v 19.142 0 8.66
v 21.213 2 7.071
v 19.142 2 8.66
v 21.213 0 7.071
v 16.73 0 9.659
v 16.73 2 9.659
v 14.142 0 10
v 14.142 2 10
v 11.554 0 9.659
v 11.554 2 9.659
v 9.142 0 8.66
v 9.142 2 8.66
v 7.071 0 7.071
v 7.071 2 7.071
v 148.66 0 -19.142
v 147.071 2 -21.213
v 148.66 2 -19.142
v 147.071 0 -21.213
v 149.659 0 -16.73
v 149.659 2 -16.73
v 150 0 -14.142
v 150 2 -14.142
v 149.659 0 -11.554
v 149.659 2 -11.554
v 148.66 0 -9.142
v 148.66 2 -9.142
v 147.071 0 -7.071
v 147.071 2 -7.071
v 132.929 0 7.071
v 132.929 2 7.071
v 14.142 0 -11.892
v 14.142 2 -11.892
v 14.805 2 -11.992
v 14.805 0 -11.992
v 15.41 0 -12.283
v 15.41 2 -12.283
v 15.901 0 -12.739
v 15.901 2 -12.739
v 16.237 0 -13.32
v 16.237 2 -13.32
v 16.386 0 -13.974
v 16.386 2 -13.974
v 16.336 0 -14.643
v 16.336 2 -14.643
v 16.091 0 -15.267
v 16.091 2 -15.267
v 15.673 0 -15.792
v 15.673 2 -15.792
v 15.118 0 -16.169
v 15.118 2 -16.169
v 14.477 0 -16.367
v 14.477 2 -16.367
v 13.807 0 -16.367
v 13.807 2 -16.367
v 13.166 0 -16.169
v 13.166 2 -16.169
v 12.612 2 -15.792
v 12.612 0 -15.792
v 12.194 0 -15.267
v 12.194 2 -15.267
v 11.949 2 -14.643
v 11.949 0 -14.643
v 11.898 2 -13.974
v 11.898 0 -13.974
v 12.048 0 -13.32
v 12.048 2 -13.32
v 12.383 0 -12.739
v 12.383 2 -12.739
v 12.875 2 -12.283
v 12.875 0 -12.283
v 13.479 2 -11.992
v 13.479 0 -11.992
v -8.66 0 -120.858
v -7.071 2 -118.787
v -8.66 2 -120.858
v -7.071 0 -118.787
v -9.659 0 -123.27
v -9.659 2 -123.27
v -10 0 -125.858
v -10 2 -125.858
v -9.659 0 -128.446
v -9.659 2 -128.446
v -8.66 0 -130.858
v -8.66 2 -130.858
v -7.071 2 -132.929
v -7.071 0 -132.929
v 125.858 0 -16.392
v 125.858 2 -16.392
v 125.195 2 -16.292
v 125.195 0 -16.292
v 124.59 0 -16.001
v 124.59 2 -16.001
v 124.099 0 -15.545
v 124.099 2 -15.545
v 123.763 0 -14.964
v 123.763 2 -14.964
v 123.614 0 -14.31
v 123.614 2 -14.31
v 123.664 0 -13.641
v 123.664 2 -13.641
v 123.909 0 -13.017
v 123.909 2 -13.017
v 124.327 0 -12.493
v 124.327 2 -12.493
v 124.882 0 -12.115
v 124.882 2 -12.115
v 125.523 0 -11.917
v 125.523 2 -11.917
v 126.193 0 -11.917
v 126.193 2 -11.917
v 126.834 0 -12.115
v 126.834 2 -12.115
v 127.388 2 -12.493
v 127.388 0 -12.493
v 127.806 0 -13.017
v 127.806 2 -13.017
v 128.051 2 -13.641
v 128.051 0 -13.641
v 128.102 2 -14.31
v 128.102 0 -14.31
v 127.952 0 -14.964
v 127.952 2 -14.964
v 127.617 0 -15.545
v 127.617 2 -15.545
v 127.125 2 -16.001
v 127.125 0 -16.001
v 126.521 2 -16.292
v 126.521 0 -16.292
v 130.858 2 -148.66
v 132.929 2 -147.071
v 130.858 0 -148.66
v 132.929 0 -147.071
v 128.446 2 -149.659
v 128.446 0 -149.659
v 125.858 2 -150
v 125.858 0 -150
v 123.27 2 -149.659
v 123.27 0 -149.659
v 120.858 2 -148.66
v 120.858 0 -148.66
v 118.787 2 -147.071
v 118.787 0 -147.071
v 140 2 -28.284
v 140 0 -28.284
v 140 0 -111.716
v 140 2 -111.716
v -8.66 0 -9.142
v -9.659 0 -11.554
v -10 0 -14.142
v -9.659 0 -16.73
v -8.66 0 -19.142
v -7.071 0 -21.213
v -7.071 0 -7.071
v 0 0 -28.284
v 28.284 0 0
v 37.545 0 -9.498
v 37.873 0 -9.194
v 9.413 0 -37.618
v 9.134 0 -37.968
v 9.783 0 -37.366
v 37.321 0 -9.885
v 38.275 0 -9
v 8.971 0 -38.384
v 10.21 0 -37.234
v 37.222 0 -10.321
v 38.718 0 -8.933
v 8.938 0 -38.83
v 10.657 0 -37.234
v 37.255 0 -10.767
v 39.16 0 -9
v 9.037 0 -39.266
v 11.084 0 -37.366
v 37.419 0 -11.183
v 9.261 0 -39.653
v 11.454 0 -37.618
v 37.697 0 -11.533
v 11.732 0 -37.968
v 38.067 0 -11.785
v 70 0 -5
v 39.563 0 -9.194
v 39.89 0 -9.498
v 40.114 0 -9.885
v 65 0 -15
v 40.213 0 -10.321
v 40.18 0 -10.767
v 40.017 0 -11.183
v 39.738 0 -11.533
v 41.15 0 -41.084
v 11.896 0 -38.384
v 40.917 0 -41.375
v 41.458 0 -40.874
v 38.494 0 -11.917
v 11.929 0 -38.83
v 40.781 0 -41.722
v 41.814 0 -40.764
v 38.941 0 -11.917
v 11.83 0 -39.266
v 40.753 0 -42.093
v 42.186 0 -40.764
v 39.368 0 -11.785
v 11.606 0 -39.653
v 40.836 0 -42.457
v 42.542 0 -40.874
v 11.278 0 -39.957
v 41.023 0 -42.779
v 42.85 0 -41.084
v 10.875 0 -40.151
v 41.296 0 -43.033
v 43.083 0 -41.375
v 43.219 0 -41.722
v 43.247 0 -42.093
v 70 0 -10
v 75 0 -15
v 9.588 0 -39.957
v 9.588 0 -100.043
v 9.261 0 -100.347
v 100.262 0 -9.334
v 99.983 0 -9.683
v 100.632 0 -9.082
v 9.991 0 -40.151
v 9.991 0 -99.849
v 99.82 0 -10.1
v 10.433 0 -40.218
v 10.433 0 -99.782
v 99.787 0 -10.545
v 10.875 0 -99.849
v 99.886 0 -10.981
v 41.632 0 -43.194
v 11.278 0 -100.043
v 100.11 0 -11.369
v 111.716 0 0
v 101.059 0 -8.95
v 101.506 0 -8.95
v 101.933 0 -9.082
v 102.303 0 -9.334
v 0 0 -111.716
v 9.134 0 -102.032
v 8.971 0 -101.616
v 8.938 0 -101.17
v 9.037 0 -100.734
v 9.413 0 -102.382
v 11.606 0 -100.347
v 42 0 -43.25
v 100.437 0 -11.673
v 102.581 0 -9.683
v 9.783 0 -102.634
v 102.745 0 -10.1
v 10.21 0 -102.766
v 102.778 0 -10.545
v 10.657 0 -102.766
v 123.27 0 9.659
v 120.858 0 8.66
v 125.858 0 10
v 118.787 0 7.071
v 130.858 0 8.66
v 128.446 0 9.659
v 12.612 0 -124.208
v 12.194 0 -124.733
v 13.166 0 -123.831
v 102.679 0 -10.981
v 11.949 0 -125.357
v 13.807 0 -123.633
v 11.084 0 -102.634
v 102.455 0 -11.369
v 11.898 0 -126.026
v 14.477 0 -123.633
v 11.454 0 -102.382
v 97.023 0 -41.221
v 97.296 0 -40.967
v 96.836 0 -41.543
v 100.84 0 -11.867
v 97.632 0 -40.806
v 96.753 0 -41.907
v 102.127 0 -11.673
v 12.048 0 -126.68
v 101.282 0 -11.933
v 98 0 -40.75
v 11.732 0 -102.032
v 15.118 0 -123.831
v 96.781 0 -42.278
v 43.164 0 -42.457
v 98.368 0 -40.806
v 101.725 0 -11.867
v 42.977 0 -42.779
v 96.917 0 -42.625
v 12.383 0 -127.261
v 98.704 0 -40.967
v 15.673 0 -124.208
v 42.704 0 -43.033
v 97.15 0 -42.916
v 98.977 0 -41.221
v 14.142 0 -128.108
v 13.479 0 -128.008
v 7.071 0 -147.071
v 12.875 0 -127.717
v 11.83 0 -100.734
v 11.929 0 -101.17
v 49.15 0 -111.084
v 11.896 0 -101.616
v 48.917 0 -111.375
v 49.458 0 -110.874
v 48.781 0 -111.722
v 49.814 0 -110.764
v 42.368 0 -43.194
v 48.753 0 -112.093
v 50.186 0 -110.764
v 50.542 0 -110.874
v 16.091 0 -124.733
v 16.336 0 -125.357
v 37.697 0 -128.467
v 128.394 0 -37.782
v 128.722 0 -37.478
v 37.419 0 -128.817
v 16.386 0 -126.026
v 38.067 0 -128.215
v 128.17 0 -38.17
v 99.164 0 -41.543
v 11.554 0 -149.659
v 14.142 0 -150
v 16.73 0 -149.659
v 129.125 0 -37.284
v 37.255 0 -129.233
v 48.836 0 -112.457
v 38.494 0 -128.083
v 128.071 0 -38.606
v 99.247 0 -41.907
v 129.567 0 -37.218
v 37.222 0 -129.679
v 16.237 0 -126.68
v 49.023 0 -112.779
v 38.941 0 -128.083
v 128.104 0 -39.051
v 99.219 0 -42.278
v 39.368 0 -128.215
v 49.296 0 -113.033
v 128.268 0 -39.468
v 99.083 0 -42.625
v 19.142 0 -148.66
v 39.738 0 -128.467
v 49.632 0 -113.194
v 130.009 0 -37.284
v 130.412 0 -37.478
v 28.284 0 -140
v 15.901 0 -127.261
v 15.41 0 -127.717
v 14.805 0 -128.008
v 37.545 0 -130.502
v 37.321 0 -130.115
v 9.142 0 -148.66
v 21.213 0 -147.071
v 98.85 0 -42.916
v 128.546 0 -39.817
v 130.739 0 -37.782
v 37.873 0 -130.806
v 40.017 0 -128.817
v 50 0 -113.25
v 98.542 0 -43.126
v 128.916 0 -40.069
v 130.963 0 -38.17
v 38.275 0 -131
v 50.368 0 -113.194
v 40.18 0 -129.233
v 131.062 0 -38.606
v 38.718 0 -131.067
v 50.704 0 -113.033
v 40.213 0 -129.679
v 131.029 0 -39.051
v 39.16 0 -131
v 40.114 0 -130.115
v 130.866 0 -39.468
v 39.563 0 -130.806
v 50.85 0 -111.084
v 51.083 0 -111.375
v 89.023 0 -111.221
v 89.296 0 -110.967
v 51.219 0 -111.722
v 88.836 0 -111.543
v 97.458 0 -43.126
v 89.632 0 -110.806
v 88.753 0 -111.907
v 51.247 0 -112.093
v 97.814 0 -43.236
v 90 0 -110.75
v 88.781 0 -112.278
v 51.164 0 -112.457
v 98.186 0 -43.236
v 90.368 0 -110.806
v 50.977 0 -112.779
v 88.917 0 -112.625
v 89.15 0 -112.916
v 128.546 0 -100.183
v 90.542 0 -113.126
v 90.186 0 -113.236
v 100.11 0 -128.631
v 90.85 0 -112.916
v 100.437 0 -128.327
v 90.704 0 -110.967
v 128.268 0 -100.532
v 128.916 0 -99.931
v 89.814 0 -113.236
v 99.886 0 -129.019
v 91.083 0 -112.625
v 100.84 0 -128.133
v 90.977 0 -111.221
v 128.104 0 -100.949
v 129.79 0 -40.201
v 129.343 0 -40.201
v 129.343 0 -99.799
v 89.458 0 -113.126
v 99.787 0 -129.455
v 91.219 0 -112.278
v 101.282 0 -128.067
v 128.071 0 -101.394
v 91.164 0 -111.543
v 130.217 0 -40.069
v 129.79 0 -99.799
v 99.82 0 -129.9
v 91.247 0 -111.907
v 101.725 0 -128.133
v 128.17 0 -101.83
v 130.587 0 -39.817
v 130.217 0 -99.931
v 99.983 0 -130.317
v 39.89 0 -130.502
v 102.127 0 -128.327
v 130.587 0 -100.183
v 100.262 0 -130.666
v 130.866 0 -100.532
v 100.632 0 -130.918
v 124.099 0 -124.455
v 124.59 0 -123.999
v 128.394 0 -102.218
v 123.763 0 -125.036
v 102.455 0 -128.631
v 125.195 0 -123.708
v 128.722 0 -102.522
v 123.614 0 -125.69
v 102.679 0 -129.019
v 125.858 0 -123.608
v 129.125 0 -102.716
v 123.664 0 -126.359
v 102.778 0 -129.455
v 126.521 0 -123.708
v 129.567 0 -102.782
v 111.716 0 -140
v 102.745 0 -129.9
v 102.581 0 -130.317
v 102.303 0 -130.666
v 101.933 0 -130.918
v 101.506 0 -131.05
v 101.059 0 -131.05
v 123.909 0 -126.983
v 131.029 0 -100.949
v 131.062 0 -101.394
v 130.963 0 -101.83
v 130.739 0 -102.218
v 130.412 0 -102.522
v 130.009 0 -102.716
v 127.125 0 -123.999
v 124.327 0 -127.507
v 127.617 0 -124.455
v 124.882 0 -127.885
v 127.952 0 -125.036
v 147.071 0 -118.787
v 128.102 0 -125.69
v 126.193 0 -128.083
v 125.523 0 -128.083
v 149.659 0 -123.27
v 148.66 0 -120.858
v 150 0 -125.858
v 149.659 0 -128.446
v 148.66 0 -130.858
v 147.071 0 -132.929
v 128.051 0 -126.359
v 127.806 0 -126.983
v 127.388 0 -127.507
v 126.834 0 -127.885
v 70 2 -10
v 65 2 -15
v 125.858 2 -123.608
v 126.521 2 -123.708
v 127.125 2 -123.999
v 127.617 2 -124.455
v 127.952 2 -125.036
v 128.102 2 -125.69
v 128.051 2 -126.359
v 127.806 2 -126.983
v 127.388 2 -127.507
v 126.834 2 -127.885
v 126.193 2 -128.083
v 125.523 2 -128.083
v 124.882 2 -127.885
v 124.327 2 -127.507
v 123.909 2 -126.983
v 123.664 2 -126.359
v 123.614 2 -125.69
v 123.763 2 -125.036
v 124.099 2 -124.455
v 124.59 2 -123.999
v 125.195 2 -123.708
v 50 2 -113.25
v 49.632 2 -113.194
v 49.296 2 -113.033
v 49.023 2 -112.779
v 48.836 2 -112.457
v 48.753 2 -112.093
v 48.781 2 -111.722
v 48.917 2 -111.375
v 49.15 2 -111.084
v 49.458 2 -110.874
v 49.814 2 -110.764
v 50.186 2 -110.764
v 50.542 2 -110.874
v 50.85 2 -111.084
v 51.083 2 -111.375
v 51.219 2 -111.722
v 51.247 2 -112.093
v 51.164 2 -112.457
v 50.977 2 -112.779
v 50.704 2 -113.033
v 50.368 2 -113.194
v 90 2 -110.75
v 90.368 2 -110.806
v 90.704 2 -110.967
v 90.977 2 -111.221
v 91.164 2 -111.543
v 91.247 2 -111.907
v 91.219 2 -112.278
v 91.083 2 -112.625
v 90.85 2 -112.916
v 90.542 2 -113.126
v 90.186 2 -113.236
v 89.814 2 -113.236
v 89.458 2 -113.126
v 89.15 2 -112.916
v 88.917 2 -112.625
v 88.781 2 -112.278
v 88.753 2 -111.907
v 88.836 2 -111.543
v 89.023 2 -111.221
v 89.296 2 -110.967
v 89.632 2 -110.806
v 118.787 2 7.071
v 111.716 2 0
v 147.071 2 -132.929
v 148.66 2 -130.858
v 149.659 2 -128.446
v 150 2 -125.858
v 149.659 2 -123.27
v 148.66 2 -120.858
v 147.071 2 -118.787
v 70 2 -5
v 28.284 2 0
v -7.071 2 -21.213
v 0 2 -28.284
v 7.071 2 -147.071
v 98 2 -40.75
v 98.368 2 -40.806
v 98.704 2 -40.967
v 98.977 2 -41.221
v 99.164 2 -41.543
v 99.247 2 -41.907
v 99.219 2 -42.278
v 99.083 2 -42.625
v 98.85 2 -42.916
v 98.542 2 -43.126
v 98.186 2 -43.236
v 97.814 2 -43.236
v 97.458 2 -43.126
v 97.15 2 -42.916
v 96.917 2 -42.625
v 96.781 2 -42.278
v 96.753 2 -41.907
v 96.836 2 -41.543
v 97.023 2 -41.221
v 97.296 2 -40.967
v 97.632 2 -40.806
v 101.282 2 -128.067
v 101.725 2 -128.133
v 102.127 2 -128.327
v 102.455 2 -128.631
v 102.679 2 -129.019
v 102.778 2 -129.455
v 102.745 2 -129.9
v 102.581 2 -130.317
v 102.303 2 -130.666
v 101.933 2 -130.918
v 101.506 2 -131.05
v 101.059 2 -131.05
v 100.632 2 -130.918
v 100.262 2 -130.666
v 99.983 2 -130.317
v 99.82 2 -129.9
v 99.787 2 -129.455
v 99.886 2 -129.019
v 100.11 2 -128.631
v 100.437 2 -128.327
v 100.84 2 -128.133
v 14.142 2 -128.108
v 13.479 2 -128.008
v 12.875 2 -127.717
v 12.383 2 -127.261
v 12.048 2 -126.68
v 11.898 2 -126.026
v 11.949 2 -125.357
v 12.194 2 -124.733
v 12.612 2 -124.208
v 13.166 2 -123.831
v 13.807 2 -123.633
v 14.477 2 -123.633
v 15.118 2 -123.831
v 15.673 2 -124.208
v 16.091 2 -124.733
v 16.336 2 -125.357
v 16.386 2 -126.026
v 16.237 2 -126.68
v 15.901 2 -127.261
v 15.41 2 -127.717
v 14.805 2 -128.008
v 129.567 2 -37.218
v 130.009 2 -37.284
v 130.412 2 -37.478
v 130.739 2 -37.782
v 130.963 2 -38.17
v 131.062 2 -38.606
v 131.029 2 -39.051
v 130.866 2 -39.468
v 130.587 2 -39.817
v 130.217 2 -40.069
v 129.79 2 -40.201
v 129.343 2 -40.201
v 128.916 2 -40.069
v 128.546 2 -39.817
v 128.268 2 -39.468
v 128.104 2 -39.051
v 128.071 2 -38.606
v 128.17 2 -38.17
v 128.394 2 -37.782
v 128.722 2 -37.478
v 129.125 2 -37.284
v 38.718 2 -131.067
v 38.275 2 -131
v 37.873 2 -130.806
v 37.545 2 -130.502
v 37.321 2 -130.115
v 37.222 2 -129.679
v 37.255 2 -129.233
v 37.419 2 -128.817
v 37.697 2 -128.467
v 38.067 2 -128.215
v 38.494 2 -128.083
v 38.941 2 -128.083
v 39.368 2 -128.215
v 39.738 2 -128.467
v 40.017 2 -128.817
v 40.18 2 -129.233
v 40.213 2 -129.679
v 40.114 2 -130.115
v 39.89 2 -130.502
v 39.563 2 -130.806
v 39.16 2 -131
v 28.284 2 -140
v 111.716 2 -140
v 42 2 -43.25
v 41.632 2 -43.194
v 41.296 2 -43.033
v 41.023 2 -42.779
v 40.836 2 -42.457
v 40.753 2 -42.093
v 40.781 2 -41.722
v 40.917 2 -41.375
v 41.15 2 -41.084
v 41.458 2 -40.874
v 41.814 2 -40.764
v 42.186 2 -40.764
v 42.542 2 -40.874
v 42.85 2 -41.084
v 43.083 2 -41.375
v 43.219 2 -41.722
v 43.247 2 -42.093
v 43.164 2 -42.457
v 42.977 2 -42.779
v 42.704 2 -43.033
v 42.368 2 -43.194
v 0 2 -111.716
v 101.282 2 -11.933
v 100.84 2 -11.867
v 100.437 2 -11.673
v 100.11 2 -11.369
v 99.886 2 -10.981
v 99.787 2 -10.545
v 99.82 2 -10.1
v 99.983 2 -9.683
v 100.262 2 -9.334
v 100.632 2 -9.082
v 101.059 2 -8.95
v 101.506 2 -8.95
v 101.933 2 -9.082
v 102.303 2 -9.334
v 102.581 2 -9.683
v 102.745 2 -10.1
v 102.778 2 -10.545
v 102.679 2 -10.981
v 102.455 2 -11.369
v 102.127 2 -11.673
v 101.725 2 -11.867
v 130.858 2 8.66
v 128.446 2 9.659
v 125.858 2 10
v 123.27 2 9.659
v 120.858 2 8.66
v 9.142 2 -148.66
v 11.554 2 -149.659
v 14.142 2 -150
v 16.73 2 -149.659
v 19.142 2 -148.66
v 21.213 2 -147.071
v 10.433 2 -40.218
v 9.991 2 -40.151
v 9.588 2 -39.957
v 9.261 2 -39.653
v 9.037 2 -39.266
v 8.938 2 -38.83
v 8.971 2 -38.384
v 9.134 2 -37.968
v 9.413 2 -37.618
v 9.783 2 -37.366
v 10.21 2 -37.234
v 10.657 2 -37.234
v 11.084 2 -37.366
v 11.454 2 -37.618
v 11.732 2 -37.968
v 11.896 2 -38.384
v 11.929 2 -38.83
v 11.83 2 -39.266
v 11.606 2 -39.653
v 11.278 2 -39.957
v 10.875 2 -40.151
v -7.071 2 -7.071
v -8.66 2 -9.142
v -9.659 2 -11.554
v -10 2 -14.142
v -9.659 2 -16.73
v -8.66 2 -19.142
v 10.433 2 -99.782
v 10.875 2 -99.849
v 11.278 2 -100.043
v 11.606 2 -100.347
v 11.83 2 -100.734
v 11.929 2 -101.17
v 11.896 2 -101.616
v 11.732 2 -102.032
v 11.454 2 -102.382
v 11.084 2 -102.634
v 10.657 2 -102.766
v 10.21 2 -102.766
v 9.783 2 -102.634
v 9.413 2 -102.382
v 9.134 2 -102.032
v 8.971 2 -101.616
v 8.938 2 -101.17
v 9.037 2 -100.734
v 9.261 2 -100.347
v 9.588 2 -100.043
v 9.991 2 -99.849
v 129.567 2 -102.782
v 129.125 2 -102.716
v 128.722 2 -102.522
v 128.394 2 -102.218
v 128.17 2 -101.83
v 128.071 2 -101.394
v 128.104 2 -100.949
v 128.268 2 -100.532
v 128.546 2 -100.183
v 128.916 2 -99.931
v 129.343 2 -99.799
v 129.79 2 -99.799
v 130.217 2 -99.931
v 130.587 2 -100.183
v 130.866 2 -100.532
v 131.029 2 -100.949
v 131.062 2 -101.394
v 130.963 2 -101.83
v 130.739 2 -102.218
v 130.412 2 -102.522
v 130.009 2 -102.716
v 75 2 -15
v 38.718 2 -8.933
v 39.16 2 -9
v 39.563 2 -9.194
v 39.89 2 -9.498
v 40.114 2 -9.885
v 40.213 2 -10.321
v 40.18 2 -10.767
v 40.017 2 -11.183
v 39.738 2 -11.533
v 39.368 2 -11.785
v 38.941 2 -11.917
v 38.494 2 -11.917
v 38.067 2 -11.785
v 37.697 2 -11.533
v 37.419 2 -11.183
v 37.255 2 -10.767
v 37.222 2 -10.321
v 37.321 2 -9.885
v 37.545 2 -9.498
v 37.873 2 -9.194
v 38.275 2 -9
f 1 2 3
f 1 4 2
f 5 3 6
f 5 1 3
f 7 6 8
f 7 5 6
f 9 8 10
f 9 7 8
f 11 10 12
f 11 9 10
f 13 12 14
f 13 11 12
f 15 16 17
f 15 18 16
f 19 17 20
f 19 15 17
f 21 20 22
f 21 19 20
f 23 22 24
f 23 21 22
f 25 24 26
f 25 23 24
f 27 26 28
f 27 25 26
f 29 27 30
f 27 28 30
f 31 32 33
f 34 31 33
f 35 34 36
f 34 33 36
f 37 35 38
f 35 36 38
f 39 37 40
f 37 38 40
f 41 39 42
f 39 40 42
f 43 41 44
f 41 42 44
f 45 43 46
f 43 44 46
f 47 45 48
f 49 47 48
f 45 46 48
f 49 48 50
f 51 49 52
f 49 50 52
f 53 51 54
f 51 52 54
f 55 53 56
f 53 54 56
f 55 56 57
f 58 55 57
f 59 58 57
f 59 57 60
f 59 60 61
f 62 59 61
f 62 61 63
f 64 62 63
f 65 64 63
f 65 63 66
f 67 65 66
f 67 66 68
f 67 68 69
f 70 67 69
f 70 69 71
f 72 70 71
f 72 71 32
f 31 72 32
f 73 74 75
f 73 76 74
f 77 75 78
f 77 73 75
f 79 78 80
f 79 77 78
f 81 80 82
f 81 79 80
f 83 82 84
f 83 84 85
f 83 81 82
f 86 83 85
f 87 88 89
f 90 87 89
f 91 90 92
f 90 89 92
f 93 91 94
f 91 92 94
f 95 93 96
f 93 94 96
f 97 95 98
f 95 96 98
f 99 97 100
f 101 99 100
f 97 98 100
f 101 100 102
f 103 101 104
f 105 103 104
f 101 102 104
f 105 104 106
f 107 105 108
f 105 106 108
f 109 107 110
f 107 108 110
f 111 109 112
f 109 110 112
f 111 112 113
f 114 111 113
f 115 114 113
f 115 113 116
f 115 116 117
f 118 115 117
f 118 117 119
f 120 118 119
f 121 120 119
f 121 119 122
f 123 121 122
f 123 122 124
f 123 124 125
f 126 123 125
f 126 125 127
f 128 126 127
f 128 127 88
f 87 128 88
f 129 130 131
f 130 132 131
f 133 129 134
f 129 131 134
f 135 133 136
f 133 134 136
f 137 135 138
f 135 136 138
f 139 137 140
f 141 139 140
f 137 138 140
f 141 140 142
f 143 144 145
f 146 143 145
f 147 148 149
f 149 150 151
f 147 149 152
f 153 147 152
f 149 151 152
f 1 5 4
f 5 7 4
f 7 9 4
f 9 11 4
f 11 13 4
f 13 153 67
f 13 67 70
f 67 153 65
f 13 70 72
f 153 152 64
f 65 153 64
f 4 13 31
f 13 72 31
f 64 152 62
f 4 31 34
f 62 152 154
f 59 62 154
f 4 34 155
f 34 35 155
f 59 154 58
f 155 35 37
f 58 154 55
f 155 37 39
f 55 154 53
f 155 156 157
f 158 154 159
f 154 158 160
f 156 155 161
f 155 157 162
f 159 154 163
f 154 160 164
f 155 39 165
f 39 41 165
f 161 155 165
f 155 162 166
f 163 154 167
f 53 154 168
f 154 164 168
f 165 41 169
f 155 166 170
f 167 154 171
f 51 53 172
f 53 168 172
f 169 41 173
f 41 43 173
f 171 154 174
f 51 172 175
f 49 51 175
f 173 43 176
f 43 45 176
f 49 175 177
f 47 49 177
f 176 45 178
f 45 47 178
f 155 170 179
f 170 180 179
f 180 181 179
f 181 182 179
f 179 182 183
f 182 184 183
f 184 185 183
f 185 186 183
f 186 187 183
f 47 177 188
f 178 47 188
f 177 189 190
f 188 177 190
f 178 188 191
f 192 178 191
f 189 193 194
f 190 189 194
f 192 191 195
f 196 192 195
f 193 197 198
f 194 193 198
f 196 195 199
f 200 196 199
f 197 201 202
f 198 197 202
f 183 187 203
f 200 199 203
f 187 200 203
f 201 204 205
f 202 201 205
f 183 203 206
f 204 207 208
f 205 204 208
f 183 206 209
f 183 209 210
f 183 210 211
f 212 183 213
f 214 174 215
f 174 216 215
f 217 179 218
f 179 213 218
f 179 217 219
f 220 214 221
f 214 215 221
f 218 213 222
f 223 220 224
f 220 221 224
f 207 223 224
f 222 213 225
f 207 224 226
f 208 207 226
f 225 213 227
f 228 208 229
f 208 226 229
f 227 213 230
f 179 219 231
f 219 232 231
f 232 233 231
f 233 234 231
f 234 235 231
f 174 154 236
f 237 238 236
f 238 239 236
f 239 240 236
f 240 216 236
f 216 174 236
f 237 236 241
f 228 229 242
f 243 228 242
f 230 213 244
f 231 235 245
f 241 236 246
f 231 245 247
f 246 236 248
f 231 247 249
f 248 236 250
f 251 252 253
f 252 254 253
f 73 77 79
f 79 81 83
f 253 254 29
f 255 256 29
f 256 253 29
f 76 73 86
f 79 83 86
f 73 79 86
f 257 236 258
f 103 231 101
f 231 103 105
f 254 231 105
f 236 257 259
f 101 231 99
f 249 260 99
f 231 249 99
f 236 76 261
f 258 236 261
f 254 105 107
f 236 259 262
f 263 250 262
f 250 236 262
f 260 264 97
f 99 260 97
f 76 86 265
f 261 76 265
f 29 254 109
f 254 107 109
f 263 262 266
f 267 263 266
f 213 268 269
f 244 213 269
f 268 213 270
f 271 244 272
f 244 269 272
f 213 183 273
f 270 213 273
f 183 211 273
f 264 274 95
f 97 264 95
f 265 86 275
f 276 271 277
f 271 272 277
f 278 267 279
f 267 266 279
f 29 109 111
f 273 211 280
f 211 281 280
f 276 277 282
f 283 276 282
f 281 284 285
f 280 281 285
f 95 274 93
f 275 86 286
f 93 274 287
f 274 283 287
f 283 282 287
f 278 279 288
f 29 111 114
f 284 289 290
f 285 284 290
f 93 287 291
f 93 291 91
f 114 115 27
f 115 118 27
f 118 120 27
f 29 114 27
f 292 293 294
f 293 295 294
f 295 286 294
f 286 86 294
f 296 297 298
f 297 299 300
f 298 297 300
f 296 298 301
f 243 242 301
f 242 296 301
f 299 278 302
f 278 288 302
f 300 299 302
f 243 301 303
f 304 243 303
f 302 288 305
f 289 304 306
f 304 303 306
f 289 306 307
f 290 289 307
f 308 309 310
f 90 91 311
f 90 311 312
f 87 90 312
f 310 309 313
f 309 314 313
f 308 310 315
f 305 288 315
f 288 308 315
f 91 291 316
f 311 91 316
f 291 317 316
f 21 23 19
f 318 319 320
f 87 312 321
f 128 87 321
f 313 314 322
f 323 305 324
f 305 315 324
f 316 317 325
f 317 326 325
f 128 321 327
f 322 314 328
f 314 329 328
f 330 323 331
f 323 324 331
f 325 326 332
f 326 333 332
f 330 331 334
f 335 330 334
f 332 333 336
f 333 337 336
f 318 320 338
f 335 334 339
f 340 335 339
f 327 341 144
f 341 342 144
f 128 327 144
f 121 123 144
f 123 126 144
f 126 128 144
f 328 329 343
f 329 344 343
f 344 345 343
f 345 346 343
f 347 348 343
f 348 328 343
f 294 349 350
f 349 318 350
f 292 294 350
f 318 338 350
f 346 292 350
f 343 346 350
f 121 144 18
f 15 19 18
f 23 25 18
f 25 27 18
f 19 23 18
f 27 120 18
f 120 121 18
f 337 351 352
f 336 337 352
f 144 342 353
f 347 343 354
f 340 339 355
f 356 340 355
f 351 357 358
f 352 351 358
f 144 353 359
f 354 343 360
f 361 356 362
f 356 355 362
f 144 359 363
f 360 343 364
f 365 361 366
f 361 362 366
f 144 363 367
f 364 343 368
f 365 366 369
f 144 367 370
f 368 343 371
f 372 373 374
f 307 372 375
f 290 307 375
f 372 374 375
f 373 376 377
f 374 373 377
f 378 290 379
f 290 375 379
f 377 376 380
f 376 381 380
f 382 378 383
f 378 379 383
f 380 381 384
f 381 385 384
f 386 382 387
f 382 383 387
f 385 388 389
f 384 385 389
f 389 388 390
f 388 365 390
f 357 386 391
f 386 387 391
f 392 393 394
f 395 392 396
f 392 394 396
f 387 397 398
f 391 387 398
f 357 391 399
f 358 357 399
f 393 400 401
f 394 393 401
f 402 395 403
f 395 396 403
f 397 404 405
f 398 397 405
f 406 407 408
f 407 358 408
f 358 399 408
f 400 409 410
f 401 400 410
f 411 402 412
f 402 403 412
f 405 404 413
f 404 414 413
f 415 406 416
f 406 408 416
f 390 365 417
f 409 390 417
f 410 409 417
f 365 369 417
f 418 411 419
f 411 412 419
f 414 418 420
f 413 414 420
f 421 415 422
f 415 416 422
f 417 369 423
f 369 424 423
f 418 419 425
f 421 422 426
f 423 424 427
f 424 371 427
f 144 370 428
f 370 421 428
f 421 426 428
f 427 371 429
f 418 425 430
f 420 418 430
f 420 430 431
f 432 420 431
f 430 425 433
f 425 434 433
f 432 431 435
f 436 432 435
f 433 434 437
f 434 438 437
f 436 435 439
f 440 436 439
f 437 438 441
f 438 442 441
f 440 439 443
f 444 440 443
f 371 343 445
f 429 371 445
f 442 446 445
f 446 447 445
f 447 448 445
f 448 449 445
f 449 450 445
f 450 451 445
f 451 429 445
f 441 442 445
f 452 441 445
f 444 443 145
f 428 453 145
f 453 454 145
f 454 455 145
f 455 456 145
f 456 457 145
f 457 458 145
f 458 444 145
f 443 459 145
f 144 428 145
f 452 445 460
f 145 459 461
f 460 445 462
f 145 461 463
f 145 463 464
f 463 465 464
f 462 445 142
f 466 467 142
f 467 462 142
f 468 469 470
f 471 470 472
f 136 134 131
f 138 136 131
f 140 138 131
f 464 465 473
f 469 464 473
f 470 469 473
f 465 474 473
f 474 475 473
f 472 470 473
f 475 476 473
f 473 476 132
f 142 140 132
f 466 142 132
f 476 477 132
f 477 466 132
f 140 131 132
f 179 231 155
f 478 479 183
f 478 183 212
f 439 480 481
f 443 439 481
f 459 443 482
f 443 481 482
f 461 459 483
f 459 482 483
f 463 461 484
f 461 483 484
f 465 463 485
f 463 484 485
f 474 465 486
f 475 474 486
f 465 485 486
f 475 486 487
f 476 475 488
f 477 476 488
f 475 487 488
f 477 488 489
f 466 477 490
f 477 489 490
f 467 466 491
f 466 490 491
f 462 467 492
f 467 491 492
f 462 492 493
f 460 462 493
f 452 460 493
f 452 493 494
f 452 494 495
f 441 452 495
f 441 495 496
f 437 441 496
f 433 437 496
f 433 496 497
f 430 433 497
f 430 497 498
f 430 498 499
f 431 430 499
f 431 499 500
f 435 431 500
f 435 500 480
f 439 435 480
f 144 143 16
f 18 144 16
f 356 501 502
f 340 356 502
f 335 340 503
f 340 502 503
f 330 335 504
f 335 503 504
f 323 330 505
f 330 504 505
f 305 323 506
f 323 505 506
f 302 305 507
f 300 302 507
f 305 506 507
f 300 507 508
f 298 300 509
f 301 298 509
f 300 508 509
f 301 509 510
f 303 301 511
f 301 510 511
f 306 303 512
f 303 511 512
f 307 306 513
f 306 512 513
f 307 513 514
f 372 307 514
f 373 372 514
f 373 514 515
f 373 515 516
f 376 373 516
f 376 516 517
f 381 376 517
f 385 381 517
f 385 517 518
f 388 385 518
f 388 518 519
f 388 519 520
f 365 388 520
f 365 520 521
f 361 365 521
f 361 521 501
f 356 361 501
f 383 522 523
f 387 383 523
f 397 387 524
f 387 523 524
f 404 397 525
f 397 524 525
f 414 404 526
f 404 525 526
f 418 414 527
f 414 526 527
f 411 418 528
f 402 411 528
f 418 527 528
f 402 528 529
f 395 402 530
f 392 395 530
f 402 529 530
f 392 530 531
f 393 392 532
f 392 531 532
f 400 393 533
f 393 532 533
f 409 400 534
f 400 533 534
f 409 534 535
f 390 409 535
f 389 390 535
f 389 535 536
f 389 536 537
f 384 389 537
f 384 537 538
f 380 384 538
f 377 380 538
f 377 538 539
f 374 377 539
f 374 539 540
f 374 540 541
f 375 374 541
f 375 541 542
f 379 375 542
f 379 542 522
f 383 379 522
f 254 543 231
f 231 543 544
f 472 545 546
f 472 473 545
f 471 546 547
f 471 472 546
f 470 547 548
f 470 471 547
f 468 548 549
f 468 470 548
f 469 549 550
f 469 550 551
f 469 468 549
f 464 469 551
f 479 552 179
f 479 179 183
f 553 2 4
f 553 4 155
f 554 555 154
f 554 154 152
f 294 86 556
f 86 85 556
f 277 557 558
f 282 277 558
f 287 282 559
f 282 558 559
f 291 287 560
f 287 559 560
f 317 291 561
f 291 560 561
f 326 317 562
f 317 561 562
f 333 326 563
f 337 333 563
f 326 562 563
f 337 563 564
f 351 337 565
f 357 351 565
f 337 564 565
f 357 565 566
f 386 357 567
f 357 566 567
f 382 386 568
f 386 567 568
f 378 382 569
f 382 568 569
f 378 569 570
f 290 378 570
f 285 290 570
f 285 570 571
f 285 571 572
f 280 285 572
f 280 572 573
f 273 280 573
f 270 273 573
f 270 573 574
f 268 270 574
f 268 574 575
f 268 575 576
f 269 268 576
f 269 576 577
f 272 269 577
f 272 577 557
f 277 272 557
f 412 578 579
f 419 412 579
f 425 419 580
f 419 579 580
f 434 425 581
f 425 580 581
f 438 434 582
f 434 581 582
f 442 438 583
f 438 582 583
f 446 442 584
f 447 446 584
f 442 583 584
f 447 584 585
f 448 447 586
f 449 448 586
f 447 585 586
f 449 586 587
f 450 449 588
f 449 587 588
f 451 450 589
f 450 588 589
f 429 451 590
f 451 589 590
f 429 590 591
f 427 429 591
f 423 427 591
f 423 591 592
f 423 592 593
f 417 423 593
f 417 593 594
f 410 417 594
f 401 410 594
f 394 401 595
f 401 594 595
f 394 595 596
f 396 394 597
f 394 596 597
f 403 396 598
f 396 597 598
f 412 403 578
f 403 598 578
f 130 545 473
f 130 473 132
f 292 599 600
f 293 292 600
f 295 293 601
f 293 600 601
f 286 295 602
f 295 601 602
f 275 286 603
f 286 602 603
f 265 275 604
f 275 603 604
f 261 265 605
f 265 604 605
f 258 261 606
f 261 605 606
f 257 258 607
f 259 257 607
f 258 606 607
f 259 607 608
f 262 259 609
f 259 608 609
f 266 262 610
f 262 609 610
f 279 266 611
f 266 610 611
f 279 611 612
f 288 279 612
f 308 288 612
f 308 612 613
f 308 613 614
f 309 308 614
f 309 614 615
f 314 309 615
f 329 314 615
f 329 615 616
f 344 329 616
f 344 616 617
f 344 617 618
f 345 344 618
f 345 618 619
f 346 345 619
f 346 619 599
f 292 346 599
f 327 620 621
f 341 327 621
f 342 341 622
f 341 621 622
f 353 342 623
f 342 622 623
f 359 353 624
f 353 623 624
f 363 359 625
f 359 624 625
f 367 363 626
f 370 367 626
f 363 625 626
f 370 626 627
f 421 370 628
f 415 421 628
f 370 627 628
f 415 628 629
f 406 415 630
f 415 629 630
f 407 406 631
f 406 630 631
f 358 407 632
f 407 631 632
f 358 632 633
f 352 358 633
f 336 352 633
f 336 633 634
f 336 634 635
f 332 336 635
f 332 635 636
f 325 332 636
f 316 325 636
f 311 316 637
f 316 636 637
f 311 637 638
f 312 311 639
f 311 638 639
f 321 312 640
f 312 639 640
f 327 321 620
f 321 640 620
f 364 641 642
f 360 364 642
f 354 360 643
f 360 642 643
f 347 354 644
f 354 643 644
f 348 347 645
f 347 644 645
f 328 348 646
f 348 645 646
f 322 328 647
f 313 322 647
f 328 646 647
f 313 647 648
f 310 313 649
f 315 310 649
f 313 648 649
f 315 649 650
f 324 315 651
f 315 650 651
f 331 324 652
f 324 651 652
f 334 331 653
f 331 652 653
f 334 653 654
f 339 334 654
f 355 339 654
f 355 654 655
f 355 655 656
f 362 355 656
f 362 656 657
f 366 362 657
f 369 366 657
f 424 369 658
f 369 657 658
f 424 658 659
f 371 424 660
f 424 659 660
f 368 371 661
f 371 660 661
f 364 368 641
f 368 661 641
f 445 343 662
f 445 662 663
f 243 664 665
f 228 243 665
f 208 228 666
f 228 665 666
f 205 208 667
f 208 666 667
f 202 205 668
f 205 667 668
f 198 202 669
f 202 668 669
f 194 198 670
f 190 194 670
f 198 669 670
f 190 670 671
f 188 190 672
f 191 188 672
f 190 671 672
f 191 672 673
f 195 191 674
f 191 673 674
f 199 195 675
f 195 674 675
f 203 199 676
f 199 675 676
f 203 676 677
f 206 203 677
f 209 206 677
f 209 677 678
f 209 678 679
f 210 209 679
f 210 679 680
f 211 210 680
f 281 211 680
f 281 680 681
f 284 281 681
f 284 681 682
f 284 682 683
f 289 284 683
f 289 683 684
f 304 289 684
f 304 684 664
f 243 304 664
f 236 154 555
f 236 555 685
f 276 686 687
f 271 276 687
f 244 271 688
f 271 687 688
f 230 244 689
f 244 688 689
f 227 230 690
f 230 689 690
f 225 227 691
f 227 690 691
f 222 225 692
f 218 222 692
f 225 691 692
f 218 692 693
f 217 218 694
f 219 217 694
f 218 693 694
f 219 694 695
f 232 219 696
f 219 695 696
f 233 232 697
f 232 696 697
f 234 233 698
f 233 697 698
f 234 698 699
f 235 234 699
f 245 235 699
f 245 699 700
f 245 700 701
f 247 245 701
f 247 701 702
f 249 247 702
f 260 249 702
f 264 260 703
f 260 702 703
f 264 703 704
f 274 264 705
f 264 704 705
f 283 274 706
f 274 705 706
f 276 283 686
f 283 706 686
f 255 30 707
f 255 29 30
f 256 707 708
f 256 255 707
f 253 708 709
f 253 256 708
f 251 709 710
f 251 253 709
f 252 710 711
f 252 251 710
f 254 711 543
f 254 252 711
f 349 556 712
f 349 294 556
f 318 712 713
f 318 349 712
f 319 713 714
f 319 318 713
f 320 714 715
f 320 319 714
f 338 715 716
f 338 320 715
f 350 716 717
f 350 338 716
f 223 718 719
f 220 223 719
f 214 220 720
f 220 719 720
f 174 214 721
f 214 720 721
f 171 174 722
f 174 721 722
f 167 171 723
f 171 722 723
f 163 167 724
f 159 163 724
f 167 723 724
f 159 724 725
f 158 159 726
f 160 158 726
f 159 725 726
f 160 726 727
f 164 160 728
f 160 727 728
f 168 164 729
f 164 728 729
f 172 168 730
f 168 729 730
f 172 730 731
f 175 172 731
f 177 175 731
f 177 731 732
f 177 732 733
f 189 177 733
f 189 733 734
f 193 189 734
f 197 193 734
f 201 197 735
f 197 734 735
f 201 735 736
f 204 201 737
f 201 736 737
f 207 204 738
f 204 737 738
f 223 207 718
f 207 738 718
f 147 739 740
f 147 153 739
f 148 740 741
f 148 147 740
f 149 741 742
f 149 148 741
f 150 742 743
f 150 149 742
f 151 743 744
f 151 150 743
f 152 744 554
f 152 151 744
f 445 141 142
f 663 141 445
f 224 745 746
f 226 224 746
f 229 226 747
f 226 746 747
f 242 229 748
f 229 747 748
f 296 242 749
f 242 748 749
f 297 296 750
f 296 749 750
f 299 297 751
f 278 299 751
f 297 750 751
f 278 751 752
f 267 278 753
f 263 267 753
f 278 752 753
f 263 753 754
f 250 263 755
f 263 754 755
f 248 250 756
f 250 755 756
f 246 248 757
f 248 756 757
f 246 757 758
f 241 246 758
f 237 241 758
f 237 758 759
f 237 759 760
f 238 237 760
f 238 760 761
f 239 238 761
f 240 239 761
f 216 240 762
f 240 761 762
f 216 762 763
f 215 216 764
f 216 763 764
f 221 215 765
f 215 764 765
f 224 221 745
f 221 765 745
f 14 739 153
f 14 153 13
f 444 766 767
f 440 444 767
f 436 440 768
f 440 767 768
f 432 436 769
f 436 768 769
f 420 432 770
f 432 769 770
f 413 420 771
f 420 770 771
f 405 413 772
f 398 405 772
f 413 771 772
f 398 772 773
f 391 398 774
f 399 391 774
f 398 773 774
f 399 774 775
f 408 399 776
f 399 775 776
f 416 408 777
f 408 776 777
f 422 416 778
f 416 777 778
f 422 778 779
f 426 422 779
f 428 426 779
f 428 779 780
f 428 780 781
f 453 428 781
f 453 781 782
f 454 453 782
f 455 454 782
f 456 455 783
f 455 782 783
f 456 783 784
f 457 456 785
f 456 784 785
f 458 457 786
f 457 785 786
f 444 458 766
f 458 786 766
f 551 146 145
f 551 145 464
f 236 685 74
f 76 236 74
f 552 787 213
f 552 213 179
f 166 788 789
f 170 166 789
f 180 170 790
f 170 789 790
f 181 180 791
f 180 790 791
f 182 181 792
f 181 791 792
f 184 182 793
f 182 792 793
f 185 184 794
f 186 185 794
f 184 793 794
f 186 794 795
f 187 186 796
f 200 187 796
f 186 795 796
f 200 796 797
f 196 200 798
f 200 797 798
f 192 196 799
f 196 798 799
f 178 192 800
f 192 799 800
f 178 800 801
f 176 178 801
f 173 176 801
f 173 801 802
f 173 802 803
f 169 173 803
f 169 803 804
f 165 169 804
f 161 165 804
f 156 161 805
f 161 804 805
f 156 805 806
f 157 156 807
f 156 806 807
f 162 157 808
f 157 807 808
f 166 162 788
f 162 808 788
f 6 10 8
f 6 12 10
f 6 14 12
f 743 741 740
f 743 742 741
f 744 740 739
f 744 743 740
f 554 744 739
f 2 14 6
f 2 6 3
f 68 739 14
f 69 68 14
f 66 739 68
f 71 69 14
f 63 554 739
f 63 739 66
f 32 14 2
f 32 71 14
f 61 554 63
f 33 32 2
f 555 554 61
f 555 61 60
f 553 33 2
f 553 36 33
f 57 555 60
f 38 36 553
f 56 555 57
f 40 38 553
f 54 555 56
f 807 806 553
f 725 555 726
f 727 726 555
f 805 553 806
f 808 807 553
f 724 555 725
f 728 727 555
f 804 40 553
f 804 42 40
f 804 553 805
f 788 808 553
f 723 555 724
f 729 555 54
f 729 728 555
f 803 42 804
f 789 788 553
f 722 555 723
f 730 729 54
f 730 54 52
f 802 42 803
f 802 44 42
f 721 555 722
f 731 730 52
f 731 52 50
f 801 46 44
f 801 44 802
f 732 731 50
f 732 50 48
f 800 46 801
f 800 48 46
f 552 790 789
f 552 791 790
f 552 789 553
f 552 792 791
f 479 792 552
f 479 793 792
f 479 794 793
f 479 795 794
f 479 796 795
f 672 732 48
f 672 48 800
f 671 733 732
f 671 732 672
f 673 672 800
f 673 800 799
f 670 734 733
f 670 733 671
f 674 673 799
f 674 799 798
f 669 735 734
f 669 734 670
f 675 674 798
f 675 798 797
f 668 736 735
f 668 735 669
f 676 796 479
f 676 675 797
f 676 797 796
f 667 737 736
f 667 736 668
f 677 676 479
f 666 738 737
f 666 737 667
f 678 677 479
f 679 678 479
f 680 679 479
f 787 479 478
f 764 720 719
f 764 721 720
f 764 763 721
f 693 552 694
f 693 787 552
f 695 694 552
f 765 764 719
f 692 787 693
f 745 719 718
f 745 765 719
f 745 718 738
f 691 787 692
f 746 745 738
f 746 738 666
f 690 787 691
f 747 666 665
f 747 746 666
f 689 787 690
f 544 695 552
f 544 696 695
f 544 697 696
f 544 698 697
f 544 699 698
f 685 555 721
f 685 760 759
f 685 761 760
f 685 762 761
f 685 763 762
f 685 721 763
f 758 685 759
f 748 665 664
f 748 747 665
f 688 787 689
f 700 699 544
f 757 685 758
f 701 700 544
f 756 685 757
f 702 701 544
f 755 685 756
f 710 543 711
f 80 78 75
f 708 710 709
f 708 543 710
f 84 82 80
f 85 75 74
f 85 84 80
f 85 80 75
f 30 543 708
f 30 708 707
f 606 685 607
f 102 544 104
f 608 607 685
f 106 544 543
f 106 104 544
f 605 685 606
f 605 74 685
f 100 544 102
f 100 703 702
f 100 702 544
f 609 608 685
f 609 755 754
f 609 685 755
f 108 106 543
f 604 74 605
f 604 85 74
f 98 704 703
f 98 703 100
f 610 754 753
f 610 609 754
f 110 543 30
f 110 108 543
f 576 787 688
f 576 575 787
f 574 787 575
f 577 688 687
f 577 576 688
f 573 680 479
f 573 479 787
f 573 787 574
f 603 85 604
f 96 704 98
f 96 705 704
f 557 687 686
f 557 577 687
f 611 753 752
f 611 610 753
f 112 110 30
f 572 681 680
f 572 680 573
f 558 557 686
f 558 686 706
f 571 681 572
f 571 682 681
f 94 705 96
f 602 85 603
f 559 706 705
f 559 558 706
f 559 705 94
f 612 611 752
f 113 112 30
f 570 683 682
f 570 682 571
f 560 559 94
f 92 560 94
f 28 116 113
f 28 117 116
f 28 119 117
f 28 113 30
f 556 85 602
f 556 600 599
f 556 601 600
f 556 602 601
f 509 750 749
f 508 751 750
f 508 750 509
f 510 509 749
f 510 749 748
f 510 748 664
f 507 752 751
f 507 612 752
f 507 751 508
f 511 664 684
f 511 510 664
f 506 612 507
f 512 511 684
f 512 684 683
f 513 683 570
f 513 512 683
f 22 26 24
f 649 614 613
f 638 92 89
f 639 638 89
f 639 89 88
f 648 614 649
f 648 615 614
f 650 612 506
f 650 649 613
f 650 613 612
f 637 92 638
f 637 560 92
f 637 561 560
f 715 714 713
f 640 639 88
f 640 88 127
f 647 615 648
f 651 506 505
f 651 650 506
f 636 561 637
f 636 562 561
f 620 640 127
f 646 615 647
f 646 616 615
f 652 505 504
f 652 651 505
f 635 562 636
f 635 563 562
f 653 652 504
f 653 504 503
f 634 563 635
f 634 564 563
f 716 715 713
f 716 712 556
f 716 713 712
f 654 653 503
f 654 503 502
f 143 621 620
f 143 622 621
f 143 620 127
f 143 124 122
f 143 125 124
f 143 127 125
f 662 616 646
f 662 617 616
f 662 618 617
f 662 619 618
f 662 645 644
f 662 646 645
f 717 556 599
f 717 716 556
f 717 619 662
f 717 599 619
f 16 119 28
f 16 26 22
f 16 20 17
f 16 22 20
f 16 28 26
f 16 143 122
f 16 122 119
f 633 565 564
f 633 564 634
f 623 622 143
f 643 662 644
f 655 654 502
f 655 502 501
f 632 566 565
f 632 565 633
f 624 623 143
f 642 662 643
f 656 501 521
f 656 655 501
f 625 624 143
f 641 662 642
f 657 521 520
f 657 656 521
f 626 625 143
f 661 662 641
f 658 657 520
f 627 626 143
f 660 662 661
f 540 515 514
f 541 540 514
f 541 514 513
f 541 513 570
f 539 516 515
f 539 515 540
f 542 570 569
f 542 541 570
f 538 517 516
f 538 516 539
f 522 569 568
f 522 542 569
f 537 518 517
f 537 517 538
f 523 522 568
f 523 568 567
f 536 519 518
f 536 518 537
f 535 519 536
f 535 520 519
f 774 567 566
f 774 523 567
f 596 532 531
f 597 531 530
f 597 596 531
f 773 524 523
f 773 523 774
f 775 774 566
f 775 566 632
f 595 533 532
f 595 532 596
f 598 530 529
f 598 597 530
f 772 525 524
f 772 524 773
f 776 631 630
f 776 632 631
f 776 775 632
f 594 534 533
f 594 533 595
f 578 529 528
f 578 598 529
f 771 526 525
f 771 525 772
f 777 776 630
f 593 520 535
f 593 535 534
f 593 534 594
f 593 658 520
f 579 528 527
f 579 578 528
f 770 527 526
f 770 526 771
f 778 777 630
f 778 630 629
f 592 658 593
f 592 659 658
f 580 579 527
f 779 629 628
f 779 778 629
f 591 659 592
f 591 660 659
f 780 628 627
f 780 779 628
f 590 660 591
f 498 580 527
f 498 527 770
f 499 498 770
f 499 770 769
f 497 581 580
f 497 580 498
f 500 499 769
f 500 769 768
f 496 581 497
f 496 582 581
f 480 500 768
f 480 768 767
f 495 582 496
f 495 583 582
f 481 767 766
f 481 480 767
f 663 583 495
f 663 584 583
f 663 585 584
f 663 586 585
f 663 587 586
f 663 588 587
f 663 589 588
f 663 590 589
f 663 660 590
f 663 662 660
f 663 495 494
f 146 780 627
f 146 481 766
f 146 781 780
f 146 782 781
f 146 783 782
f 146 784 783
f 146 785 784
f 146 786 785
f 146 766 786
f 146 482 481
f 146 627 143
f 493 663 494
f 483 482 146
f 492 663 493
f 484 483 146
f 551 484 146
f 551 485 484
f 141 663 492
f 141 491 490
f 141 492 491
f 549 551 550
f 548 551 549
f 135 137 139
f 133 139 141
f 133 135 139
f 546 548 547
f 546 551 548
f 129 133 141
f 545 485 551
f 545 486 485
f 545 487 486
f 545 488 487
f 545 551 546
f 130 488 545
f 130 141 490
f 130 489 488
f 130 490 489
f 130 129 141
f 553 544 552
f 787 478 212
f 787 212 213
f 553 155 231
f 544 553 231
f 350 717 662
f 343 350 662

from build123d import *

# Parameters (mm, degrees)
SKETCH1_W           = 140
SKETCH1_H           = 140
BOSS_EXTRUDE1_DEPTH = 2
BOSS_EXTRUDE3_DEPTH = 2
FILLET1_R           = 10
SKETCH4_R           = 1.5
CUT_EXTRUDE2_DEPTH  = 2
SKETCH5_R           = 2.25
CUT_EXTRUDE3_DEPTH  = 10
SKETCH6_R           = 1.25
CUT_EXTRUDE4_DEPTH  = 15
CUT_EXTRUDE5_DEPTH  = 2


with BuildPart() as part:
    # Sketch1 → Boss-Extrude1 (new body)
    with BuildSketch(Plane(origin=(0, 0, 0), x_dir=(1, 0, 0), z_dir=(0, 1, 0))):
        with Locations((70, 70)):
            Rectangle(SKETCH1_W, SKETCH1_H)
    extrude(amount=BOSS_EXTRUDE1_DEPTH)

    # Sketch2 → Boss-Extrude3 (add)
    with BuildSketch(Plane(origin=(0, 2, 0), x_dir=(1, 0, 0), z_dir=(0, 1, 0))):
        Polygon((111.715728753, 140), (140, 111.715728753), (154.142135624, 125.857864376), (125.857864376, 154.142135624), align=None)
        Polygon((0, 111.715728753), (-14.142135624, 125.857864376), (14.142135624, 154.142135624), (28.284271247, 140), align=None)
        Polygon((28.284271247, 0), (0, 28.284271247), (-14.142135624, 14.142135624), (14.142135624, -14.142135624), align=None)
        Polygon((140, 28.284271247), (154.142135624, 14.142135624), (125.857864376, -14.142135624), (111.715728753, 0), align=None)
    extrude(amount=-BOSS_EXTRUDE3_DEPTH)

    # Fillet1
    fillet1_edges = [part.edges().sort_by_distance(p)[0] for p in [
        (125.857864376, 1, -154.142135624),
        (154.142135624, 1, -125.857864376),
        (-14.142135624, 1, -125.857864376),
        (14.142135624, 1, -154.142135624),
        (14.142135624, 1, 14.142135624),
        (-14.142135624, 1, -14.142135624),
        (154.142135624, 1, -14.142135624),
        (125.857864376, 1, 14.142135624),
    ]]
    fillet(fillet1_edges, radius=FILLET1_R)

    # Sketch4 → Cut-Extrude2 (cut)
    with BuildSketch(Plane(origin=(0, 2, 0), x_dir=(1, 0, 0), z_dir=(0, 1, 0))):
        with Locations(Location((38.717631804, 10.433360556, 0), (0, 0, 270))):
            Circle(SKETCH4_R)
        with Locations(Location((10.433360556, 38.717631804, 0), (0, 0, 90))):
            Circle(SKETCH4_R)
        with Locations(Location((101.282368196, 10.433360556, 0), (0, 0, 90))):
            Circle(SKETCH4_R)
        with Locations(Location((129.566639444, 38.717631804, 0), (0, 0, 270))):
            Circle(SKETCH4_R)
        with Locations(Location((38.717631804, 129.566639444, 0), (0, 0, 90))):
            Circle(SKETCH4_R)
        with Locations(Location((10.433360556, 101.282368196, 0), (0, 0, 270))):
            Circle(SKETCH4_R)
        with Locations(Location((101.282368196, 129.566639444, 0), (0, 0, 270))):
            Circle(SKETCH4_R)
        with Locations(Location((129.566639444, 101.282368196, 0), (0, 0, 90))):
            Circle(SKETCH4_R)
    extrude(amount=-CUT_EXTRUDE2_DEPTH, mode=Mode.SUBTRACT)

    # Sketch5 → Cut-Extrude3 (cut)
    with BuildSketch(Plane(origin=(0, 2, 0), x_dir=(1, 0, 0), z_dir=(0, 1, 0))):
        with Locations(Location((14.142135624, 14.142135624, 0), (0, 0, 270))):
            Circle(SKETCH5_R)
        with Locations(Location((125.857864376, 14.142135624, 0), (0, 0, 90))):
            Circle(SKETCH5_R)
        with Locations(Location((14.142135624, 125.857864376, 0), (0, 0, 90))):
            Circle(SKETCH5_R)
        with Locations(Location((125.857864376, 125.857864376, 0), (0, 0, 270))):
            Circle(SKETCH5_R)
    extrude(amount=-CUT_EXTRUDE3_DEPTH, mode=Mode.SUBTRACT)

    # Sketch6 → Cut-Extrude4 (cut)
    with BuildSketch(Plane(origin=(0, 2, 0), x_dir=(1, 0, 0), z_dir=(0, 1, 0))):
        with Locations(Location((90, 111.999971357, 0), (0, 0, 270))):
            Circle(SKETCH6_R)
        with Locations(Location((98, 41.999971357, 0), (0, 0, 270))):
            Circle(SKETCH6_R)
        with Locations(Location((42, 41.999971357, 0), (0, 0, 90))):
            Circle(SKETCH6_R)
        with Locations(Location((50, 111.999971357, 0), (0, 0, 90))):
            Circle(SKETCH6_R)
    extrude(amount=-CUT_EXTRUDE4_DEPTH, mode=Mode.SUBTRACT)

    # Sketch7 → Cut-Extrude5 (cut)
    with BuildSketch(Plane(origin=(0, 2, 0), x_dir=(1, 0, 0), z_dir=(0, 1, 0))):
        Polygon((75, 15), (70, 5), (65, 15), (70, 10), align=None)
    extrude(amount=-CUT_EXTRUDE5_DEPTH, mode=Mode.SUBTRACT)


solid = part.part
